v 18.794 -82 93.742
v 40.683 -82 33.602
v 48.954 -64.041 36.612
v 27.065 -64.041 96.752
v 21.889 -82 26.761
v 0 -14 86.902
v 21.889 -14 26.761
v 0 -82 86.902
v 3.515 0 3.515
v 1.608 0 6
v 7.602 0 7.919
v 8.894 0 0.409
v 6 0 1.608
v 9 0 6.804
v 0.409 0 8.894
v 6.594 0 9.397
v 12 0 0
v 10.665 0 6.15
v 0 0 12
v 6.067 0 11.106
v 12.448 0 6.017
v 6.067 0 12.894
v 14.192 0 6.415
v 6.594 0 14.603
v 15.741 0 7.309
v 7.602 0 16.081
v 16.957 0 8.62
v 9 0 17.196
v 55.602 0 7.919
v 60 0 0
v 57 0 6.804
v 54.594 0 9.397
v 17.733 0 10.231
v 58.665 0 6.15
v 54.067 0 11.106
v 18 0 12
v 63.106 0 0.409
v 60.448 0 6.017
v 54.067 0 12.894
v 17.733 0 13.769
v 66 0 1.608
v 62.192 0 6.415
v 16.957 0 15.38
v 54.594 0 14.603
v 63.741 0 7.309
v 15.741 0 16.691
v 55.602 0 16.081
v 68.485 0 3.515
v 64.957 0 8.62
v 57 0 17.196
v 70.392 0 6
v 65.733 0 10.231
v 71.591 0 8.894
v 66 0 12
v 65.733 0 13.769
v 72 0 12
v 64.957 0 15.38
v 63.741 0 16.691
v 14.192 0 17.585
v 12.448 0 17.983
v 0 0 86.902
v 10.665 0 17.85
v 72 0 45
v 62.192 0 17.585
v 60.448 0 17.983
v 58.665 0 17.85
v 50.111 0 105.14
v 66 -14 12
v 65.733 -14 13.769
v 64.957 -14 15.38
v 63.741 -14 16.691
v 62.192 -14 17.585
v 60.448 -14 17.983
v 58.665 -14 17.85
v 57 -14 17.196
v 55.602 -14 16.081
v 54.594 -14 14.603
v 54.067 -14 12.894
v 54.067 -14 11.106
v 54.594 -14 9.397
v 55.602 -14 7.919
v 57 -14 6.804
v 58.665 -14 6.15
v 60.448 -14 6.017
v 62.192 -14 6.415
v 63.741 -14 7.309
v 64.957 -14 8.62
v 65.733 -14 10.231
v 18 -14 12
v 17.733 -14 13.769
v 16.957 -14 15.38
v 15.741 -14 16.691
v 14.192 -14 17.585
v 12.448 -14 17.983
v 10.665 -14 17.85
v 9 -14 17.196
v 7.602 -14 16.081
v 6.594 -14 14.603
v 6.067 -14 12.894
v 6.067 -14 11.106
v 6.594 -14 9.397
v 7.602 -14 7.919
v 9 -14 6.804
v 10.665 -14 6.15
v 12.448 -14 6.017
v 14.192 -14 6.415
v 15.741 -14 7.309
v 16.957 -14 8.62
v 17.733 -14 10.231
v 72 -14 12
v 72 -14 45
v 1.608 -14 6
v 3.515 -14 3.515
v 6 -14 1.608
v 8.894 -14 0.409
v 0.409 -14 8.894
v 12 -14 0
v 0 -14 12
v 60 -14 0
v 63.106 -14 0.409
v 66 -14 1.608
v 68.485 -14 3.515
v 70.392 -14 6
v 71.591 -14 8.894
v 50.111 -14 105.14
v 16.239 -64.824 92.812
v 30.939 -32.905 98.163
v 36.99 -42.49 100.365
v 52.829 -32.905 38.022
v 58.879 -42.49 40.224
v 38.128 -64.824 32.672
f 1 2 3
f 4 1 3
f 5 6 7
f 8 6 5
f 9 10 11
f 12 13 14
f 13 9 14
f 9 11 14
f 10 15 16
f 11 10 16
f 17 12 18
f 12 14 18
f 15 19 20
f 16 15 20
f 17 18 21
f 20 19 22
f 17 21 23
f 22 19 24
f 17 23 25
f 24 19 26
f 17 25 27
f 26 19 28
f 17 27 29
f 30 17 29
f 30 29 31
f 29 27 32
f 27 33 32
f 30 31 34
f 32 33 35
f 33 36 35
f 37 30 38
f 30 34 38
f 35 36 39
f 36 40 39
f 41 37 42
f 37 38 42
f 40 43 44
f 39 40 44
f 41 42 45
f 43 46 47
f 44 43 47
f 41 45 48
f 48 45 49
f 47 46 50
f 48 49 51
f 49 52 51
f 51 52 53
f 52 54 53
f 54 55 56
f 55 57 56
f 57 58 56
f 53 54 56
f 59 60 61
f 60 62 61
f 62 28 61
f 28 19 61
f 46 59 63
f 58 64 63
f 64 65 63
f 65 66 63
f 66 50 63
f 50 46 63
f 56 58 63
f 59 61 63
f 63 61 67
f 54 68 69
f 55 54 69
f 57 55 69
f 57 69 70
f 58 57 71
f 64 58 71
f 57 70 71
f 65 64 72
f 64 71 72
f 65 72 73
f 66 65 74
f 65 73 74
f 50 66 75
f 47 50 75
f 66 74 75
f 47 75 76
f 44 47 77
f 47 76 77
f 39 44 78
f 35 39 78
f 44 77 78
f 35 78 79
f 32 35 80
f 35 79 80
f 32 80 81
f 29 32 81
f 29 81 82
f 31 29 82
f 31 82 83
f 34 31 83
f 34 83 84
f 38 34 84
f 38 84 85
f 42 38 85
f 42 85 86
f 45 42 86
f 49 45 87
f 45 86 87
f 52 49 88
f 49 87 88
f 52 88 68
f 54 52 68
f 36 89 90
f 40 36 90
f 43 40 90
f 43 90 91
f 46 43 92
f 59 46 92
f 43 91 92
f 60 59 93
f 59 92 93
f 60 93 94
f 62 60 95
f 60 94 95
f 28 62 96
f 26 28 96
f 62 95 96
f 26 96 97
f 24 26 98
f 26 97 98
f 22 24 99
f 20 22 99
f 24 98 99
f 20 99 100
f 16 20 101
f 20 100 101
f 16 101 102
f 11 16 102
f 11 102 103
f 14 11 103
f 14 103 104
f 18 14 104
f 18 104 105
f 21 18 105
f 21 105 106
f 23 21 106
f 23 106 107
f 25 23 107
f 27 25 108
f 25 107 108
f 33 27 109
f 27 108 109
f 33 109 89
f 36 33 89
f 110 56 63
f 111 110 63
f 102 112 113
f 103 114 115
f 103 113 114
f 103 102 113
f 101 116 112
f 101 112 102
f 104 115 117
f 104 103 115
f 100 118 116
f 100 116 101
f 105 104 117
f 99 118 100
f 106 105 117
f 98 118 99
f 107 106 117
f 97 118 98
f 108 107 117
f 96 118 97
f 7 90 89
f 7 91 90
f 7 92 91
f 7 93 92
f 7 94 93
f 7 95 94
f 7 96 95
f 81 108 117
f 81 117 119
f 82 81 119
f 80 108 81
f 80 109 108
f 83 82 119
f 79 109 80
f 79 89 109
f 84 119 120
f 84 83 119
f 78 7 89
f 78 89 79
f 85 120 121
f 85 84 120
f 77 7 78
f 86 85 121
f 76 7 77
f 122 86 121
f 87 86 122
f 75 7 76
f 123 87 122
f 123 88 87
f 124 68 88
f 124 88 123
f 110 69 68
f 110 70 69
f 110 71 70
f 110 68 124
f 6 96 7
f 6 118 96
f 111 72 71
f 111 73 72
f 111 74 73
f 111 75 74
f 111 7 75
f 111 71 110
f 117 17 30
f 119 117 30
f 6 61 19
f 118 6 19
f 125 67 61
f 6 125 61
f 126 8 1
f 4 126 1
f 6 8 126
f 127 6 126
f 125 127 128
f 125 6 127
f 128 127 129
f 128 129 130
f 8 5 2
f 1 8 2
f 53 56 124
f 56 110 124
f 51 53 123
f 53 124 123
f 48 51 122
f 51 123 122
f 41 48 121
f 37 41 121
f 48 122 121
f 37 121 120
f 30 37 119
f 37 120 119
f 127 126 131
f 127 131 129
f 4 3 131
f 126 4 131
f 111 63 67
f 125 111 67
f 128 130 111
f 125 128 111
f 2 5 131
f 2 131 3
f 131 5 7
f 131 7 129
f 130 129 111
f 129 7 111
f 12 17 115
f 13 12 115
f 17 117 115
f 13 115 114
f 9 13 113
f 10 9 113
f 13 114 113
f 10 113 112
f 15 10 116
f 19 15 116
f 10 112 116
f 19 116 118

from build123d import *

# Parameters (mm, degrees)
F1_DEPTH = 14
F3_DEPTH = 64
F4_R     = 12
F5_R     = 6
F6_DEPTH = 14


with BuildPart() as f1:
    # F0 (on Front) → F1 (new body)
    with BuildSketch(Plane.XZ):
        Polygon((0, 86.9015205713), (0, 0), (72, 0), (72, 45), (50.1107108272, 105.1403277303), align=None)
    extrude(amount=F1_DEPTH)

    # F2 (on face) → F3 (join, through all)
    with BuildSketch(Plane(origin=(-27.9296103431, 0, 76.7359737518), x_dir=(0.9396926208, 0, 0.3420201433), z_dir=(-0.3420201433, 0, 0.9396926208))):
        Polygon((83.0487751462, -14), (29.722070521, -14), (29.722070521, -82), (49.722070521, -82), (58.5238033349, -64.0408936895), (47.0034087749, -64.8243747139), (62.647170961, -32.9047522785), (69.0858827116, -42.4899661168), align=None)
    extrude(amount=-F3_DEPTH)

    # F4
    f4_edges = [f1.edges().sort_by_distance(p)[0] for p in [
        (0, -7, 0),
        (72, -7, 0),
    ]]
    fillet(f4_edges, radius=F4_R)

    # F5 (on face) → F6 (cut, through all)
    with BuildSketch(Plane.XZ.offset(14)):
        with Locations((12, 12)):
            Circle(F5_R)
        with Locations((60, 12)):
            Circle(F5_R)
    extrude(amount=-F6_DEPTH, mode=Mode.SUBTRACT)


solid = f1.part
